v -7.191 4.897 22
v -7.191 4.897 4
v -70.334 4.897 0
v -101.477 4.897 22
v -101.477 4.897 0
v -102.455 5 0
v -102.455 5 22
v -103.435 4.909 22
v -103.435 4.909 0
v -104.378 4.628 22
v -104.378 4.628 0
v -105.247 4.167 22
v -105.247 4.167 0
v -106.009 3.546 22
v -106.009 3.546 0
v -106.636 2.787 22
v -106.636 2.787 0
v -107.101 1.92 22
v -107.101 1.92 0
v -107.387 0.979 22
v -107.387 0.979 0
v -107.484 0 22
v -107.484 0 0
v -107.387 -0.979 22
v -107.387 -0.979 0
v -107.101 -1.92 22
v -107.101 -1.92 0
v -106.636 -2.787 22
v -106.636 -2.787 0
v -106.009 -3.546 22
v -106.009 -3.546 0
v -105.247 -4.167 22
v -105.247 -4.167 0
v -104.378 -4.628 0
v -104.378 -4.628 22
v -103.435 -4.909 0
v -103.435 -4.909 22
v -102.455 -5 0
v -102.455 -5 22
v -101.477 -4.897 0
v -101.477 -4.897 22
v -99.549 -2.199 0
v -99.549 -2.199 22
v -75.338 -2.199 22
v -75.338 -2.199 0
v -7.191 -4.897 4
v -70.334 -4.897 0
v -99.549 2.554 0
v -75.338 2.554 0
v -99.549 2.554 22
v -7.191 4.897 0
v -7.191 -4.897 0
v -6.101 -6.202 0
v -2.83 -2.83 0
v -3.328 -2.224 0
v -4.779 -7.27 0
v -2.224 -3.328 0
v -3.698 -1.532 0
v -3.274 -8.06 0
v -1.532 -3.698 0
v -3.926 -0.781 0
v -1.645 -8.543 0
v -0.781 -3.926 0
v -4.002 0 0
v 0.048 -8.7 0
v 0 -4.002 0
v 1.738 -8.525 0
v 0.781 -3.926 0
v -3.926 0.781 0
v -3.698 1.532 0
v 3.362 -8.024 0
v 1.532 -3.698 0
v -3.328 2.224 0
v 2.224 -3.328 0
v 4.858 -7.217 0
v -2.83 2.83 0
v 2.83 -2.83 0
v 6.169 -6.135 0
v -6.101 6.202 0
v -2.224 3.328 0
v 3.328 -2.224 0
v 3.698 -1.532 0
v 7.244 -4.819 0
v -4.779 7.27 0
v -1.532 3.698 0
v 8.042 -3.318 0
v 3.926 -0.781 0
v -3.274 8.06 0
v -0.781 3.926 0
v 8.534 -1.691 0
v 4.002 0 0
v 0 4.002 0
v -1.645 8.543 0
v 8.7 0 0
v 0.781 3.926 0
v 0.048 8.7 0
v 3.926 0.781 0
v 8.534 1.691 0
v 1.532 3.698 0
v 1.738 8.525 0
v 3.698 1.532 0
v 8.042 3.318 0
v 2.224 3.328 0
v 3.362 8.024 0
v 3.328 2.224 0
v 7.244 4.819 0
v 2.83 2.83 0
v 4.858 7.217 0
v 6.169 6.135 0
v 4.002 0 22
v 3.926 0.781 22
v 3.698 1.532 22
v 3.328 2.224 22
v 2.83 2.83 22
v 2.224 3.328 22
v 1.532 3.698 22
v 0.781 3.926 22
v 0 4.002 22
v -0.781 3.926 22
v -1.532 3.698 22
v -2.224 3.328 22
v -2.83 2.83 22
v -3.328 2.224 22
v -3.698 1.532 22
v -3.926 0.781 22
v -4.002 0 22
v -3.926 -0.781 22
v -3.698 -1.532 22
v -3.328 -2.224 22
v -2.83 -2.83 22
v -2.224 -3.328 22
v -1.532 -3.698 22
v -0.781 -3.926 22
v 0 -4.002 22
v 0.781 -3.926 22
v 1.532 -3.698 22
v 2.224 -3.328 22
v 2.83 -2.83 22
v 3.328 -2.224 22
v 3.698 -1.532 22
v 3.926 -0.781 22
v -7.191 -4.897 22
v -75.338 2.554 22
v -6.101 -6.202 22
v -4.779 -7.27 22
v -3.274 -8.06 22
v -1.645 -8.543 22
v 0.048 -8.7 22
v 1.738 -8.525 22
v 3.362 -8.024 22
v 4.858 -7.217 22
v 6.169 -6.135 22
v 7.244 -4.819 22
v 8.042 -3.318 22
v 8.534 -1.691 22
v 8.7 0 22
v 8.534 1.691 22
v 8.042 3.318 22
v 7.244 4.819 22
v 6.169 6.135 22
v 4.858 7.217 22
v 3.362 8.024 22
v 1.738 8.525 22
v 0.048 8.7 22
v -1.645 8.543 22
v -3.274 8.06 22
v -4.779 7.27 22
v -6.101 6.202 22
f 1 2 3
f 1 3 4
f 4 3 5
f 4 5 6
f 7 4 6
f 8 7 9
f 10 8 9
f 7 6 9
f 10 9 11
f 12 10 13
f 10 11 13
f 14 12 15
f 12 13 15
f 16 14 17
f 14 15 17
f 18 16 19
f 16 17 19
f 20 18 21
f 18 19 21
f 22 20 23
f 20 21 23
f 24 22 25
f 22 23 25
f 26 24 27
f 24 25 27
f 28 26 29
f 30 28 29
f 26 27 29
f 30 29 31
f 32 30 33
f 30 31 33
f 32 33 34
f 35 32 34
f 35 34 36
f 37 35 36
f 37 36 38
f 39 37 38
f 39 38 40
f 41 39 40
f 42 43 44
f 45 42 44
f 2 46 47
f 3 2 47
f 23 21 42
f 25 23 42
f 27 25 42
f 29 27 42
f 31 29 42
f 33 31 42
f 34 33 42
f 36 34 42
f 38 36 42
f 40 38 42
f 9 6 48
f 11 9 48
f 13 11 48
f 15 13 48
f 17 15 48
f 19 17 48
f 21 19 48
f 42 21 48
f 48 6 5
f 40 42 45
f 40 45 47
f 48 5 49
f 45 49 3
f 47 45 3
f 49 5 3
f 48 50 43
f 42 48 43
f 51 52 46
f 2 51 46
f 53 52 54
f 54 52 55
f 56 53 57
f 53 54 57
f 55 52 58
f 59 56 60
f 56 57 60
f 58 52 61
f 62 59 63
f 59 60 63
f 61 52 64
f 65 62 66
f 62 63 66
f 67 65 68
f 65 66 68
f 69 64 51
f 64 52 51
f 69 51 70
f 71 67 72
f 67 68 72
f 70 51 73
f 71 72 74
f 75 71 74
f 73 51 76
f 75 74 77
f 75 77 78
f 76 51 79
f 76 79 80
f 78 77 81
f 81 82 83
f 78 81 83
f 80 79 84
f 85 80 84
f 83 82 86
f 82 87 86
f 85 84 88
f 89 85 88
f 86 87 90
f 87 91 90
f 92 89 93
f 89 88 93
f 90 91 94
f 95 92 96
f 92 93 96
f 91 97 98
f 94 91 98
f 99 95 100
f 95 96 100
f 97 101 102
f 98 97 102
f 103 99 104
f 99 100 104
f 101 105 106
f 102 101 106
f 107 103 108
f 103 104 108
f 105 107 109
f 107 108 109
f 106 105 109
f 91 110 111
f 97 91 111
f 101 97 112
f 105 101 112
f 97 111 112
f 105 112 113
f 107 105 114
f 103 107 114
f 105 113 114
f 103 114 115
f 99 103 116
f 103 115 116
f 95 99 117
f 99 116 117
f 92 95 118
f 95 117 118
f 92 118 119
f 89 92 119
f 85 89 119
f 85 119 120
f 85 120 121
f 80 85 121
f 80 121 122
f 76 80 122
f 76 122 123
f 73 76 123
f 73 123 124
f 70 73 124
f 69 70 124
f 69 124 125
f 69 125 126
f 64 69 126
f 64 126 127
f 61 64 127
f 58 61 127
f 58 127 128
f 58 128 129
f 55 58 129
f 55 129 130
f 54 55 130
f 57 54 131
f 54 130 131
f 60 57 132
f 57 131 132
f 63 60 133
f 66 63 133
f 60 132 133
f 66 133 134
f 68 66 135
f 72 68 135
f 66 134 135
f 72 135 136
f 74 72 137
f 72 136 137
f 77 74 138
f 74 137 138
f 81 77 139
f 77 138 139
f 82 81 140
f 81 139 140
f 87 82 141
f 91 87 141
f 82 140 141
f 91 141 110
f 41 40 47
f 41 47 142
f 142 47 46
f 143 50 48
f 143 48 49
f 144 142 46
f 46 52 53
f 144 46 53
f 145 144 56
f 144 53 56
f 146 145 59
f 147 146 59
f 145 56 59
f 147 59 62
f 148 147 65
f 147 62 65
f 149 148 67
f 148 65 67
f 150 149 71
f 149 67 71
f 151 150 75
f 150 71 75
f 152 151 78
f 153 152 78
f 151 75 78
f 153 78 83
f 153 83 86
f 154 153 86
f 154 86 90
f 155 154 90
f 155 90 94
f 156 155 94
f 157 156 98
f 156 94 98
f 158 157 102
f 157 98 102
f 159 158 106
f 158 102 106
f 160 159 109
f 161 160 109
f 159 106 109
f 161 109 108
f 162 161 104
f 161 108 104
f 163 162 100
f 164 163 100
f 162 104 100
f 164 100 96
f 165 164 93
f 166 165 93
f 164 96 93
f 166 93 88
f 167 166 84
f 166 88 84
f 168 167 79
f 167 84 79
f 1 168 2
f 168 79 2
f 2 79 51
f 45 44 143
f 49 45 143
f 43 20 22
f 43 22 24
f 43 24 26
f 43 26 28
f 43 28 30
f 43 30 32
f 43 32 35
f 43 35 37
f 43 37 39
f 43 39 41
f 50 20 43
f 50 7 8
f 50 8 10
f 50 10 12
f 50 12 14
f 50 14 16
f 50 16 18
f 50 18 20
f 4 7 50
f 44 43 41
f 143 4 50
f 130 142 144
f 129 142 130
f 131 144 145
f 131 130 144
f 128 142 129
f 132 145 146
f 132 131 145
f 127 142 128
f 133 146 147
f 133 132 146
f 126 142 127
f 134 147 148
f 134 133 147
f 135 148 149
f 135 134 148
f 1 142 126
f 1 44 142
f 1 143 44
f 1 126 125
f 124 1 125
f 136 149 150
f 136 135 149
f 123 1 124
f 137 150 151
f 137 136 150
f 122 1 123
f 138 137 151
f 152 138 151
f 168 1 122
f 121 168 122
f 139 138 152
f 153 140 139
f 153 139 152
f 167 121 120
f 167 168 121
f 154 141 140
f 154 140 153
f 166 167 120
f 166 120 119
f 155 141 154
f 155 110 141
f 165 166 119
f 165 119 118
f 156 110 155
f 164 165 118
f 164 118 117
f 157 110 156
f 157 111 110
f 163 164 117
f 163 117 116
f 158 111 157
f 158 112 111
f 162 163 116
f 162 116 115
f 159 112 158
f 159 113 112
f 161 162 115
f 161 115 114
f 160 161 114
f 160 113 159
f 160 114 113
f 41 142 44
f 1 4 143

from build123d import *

# Parameters (mm, degrees)
F1_DEPTH = 22
F3_DEPTH = 13.5984562425
F4_W     = 24.2116302252
F4_H     = 2.5544243399
F4_H_2   = 2.1986933425
F5_DEPTH = 22.001
F6_R     = 4.0024769444
F7_DEPTH = 22.001


with BuildPart() as f1:
    # F0 (on Top) → F1 (new body)
    with BuildSketch(Plane.XY):
        with BuildLine():
            Line((-101.4767971394, -4.8974562425), (-7.1906134893, -4.8974562425))
            ThreePointArc((-7.1906134893, -4.8974562425), (8.7, 0), (-7.1906134893, 4.8974562425))
            Line((-7.1906134893, 4.8974562425), (-101.4767971394, 4.8974562425))
            ThreePointArc((-101.4767971394, 4.8974562425), (-107.4842306869, 0), (-101.4767971394, -4.8974562425))
        make_face()
    extrude(amount=F1_DEPTH)

    # F2 (on face) → F3 (cut, through all)
    with BuildSketch(Plane.XZ.offset(4.8974562425)):
        Polygon((-7.1906134893, 3.9995550178), (-70.3336670995, 0), (-7.1906134893, 0), align=None)
    extrude(amount=-F3_DEPTH, mode=Mode.SUBTRACT)

    # F4 (on face) → F5 (cut, through all)
    with BuildSketch(Plane.XY.offset(22)):
        with Locations((-87.4435827136, 1.27721217)):
            Rectangle(F4_W, F4_H)
        with Locations((-87.4435827136, -1.0993466713)):
            Rectangle(F4_W, F4_H_2)
    extrude(amount=-F5_DEPTH, mode=Mode.SUBTRACT)

    # F6 (on face) → F7 (cut, through all)
    with BuildSketch(Plane.XY.offset(22)):
        Circle(F6_R)
    extrude(amount=-F7_DEPTH, mode=Mode.SUBTRACT)


solid = f1.part
